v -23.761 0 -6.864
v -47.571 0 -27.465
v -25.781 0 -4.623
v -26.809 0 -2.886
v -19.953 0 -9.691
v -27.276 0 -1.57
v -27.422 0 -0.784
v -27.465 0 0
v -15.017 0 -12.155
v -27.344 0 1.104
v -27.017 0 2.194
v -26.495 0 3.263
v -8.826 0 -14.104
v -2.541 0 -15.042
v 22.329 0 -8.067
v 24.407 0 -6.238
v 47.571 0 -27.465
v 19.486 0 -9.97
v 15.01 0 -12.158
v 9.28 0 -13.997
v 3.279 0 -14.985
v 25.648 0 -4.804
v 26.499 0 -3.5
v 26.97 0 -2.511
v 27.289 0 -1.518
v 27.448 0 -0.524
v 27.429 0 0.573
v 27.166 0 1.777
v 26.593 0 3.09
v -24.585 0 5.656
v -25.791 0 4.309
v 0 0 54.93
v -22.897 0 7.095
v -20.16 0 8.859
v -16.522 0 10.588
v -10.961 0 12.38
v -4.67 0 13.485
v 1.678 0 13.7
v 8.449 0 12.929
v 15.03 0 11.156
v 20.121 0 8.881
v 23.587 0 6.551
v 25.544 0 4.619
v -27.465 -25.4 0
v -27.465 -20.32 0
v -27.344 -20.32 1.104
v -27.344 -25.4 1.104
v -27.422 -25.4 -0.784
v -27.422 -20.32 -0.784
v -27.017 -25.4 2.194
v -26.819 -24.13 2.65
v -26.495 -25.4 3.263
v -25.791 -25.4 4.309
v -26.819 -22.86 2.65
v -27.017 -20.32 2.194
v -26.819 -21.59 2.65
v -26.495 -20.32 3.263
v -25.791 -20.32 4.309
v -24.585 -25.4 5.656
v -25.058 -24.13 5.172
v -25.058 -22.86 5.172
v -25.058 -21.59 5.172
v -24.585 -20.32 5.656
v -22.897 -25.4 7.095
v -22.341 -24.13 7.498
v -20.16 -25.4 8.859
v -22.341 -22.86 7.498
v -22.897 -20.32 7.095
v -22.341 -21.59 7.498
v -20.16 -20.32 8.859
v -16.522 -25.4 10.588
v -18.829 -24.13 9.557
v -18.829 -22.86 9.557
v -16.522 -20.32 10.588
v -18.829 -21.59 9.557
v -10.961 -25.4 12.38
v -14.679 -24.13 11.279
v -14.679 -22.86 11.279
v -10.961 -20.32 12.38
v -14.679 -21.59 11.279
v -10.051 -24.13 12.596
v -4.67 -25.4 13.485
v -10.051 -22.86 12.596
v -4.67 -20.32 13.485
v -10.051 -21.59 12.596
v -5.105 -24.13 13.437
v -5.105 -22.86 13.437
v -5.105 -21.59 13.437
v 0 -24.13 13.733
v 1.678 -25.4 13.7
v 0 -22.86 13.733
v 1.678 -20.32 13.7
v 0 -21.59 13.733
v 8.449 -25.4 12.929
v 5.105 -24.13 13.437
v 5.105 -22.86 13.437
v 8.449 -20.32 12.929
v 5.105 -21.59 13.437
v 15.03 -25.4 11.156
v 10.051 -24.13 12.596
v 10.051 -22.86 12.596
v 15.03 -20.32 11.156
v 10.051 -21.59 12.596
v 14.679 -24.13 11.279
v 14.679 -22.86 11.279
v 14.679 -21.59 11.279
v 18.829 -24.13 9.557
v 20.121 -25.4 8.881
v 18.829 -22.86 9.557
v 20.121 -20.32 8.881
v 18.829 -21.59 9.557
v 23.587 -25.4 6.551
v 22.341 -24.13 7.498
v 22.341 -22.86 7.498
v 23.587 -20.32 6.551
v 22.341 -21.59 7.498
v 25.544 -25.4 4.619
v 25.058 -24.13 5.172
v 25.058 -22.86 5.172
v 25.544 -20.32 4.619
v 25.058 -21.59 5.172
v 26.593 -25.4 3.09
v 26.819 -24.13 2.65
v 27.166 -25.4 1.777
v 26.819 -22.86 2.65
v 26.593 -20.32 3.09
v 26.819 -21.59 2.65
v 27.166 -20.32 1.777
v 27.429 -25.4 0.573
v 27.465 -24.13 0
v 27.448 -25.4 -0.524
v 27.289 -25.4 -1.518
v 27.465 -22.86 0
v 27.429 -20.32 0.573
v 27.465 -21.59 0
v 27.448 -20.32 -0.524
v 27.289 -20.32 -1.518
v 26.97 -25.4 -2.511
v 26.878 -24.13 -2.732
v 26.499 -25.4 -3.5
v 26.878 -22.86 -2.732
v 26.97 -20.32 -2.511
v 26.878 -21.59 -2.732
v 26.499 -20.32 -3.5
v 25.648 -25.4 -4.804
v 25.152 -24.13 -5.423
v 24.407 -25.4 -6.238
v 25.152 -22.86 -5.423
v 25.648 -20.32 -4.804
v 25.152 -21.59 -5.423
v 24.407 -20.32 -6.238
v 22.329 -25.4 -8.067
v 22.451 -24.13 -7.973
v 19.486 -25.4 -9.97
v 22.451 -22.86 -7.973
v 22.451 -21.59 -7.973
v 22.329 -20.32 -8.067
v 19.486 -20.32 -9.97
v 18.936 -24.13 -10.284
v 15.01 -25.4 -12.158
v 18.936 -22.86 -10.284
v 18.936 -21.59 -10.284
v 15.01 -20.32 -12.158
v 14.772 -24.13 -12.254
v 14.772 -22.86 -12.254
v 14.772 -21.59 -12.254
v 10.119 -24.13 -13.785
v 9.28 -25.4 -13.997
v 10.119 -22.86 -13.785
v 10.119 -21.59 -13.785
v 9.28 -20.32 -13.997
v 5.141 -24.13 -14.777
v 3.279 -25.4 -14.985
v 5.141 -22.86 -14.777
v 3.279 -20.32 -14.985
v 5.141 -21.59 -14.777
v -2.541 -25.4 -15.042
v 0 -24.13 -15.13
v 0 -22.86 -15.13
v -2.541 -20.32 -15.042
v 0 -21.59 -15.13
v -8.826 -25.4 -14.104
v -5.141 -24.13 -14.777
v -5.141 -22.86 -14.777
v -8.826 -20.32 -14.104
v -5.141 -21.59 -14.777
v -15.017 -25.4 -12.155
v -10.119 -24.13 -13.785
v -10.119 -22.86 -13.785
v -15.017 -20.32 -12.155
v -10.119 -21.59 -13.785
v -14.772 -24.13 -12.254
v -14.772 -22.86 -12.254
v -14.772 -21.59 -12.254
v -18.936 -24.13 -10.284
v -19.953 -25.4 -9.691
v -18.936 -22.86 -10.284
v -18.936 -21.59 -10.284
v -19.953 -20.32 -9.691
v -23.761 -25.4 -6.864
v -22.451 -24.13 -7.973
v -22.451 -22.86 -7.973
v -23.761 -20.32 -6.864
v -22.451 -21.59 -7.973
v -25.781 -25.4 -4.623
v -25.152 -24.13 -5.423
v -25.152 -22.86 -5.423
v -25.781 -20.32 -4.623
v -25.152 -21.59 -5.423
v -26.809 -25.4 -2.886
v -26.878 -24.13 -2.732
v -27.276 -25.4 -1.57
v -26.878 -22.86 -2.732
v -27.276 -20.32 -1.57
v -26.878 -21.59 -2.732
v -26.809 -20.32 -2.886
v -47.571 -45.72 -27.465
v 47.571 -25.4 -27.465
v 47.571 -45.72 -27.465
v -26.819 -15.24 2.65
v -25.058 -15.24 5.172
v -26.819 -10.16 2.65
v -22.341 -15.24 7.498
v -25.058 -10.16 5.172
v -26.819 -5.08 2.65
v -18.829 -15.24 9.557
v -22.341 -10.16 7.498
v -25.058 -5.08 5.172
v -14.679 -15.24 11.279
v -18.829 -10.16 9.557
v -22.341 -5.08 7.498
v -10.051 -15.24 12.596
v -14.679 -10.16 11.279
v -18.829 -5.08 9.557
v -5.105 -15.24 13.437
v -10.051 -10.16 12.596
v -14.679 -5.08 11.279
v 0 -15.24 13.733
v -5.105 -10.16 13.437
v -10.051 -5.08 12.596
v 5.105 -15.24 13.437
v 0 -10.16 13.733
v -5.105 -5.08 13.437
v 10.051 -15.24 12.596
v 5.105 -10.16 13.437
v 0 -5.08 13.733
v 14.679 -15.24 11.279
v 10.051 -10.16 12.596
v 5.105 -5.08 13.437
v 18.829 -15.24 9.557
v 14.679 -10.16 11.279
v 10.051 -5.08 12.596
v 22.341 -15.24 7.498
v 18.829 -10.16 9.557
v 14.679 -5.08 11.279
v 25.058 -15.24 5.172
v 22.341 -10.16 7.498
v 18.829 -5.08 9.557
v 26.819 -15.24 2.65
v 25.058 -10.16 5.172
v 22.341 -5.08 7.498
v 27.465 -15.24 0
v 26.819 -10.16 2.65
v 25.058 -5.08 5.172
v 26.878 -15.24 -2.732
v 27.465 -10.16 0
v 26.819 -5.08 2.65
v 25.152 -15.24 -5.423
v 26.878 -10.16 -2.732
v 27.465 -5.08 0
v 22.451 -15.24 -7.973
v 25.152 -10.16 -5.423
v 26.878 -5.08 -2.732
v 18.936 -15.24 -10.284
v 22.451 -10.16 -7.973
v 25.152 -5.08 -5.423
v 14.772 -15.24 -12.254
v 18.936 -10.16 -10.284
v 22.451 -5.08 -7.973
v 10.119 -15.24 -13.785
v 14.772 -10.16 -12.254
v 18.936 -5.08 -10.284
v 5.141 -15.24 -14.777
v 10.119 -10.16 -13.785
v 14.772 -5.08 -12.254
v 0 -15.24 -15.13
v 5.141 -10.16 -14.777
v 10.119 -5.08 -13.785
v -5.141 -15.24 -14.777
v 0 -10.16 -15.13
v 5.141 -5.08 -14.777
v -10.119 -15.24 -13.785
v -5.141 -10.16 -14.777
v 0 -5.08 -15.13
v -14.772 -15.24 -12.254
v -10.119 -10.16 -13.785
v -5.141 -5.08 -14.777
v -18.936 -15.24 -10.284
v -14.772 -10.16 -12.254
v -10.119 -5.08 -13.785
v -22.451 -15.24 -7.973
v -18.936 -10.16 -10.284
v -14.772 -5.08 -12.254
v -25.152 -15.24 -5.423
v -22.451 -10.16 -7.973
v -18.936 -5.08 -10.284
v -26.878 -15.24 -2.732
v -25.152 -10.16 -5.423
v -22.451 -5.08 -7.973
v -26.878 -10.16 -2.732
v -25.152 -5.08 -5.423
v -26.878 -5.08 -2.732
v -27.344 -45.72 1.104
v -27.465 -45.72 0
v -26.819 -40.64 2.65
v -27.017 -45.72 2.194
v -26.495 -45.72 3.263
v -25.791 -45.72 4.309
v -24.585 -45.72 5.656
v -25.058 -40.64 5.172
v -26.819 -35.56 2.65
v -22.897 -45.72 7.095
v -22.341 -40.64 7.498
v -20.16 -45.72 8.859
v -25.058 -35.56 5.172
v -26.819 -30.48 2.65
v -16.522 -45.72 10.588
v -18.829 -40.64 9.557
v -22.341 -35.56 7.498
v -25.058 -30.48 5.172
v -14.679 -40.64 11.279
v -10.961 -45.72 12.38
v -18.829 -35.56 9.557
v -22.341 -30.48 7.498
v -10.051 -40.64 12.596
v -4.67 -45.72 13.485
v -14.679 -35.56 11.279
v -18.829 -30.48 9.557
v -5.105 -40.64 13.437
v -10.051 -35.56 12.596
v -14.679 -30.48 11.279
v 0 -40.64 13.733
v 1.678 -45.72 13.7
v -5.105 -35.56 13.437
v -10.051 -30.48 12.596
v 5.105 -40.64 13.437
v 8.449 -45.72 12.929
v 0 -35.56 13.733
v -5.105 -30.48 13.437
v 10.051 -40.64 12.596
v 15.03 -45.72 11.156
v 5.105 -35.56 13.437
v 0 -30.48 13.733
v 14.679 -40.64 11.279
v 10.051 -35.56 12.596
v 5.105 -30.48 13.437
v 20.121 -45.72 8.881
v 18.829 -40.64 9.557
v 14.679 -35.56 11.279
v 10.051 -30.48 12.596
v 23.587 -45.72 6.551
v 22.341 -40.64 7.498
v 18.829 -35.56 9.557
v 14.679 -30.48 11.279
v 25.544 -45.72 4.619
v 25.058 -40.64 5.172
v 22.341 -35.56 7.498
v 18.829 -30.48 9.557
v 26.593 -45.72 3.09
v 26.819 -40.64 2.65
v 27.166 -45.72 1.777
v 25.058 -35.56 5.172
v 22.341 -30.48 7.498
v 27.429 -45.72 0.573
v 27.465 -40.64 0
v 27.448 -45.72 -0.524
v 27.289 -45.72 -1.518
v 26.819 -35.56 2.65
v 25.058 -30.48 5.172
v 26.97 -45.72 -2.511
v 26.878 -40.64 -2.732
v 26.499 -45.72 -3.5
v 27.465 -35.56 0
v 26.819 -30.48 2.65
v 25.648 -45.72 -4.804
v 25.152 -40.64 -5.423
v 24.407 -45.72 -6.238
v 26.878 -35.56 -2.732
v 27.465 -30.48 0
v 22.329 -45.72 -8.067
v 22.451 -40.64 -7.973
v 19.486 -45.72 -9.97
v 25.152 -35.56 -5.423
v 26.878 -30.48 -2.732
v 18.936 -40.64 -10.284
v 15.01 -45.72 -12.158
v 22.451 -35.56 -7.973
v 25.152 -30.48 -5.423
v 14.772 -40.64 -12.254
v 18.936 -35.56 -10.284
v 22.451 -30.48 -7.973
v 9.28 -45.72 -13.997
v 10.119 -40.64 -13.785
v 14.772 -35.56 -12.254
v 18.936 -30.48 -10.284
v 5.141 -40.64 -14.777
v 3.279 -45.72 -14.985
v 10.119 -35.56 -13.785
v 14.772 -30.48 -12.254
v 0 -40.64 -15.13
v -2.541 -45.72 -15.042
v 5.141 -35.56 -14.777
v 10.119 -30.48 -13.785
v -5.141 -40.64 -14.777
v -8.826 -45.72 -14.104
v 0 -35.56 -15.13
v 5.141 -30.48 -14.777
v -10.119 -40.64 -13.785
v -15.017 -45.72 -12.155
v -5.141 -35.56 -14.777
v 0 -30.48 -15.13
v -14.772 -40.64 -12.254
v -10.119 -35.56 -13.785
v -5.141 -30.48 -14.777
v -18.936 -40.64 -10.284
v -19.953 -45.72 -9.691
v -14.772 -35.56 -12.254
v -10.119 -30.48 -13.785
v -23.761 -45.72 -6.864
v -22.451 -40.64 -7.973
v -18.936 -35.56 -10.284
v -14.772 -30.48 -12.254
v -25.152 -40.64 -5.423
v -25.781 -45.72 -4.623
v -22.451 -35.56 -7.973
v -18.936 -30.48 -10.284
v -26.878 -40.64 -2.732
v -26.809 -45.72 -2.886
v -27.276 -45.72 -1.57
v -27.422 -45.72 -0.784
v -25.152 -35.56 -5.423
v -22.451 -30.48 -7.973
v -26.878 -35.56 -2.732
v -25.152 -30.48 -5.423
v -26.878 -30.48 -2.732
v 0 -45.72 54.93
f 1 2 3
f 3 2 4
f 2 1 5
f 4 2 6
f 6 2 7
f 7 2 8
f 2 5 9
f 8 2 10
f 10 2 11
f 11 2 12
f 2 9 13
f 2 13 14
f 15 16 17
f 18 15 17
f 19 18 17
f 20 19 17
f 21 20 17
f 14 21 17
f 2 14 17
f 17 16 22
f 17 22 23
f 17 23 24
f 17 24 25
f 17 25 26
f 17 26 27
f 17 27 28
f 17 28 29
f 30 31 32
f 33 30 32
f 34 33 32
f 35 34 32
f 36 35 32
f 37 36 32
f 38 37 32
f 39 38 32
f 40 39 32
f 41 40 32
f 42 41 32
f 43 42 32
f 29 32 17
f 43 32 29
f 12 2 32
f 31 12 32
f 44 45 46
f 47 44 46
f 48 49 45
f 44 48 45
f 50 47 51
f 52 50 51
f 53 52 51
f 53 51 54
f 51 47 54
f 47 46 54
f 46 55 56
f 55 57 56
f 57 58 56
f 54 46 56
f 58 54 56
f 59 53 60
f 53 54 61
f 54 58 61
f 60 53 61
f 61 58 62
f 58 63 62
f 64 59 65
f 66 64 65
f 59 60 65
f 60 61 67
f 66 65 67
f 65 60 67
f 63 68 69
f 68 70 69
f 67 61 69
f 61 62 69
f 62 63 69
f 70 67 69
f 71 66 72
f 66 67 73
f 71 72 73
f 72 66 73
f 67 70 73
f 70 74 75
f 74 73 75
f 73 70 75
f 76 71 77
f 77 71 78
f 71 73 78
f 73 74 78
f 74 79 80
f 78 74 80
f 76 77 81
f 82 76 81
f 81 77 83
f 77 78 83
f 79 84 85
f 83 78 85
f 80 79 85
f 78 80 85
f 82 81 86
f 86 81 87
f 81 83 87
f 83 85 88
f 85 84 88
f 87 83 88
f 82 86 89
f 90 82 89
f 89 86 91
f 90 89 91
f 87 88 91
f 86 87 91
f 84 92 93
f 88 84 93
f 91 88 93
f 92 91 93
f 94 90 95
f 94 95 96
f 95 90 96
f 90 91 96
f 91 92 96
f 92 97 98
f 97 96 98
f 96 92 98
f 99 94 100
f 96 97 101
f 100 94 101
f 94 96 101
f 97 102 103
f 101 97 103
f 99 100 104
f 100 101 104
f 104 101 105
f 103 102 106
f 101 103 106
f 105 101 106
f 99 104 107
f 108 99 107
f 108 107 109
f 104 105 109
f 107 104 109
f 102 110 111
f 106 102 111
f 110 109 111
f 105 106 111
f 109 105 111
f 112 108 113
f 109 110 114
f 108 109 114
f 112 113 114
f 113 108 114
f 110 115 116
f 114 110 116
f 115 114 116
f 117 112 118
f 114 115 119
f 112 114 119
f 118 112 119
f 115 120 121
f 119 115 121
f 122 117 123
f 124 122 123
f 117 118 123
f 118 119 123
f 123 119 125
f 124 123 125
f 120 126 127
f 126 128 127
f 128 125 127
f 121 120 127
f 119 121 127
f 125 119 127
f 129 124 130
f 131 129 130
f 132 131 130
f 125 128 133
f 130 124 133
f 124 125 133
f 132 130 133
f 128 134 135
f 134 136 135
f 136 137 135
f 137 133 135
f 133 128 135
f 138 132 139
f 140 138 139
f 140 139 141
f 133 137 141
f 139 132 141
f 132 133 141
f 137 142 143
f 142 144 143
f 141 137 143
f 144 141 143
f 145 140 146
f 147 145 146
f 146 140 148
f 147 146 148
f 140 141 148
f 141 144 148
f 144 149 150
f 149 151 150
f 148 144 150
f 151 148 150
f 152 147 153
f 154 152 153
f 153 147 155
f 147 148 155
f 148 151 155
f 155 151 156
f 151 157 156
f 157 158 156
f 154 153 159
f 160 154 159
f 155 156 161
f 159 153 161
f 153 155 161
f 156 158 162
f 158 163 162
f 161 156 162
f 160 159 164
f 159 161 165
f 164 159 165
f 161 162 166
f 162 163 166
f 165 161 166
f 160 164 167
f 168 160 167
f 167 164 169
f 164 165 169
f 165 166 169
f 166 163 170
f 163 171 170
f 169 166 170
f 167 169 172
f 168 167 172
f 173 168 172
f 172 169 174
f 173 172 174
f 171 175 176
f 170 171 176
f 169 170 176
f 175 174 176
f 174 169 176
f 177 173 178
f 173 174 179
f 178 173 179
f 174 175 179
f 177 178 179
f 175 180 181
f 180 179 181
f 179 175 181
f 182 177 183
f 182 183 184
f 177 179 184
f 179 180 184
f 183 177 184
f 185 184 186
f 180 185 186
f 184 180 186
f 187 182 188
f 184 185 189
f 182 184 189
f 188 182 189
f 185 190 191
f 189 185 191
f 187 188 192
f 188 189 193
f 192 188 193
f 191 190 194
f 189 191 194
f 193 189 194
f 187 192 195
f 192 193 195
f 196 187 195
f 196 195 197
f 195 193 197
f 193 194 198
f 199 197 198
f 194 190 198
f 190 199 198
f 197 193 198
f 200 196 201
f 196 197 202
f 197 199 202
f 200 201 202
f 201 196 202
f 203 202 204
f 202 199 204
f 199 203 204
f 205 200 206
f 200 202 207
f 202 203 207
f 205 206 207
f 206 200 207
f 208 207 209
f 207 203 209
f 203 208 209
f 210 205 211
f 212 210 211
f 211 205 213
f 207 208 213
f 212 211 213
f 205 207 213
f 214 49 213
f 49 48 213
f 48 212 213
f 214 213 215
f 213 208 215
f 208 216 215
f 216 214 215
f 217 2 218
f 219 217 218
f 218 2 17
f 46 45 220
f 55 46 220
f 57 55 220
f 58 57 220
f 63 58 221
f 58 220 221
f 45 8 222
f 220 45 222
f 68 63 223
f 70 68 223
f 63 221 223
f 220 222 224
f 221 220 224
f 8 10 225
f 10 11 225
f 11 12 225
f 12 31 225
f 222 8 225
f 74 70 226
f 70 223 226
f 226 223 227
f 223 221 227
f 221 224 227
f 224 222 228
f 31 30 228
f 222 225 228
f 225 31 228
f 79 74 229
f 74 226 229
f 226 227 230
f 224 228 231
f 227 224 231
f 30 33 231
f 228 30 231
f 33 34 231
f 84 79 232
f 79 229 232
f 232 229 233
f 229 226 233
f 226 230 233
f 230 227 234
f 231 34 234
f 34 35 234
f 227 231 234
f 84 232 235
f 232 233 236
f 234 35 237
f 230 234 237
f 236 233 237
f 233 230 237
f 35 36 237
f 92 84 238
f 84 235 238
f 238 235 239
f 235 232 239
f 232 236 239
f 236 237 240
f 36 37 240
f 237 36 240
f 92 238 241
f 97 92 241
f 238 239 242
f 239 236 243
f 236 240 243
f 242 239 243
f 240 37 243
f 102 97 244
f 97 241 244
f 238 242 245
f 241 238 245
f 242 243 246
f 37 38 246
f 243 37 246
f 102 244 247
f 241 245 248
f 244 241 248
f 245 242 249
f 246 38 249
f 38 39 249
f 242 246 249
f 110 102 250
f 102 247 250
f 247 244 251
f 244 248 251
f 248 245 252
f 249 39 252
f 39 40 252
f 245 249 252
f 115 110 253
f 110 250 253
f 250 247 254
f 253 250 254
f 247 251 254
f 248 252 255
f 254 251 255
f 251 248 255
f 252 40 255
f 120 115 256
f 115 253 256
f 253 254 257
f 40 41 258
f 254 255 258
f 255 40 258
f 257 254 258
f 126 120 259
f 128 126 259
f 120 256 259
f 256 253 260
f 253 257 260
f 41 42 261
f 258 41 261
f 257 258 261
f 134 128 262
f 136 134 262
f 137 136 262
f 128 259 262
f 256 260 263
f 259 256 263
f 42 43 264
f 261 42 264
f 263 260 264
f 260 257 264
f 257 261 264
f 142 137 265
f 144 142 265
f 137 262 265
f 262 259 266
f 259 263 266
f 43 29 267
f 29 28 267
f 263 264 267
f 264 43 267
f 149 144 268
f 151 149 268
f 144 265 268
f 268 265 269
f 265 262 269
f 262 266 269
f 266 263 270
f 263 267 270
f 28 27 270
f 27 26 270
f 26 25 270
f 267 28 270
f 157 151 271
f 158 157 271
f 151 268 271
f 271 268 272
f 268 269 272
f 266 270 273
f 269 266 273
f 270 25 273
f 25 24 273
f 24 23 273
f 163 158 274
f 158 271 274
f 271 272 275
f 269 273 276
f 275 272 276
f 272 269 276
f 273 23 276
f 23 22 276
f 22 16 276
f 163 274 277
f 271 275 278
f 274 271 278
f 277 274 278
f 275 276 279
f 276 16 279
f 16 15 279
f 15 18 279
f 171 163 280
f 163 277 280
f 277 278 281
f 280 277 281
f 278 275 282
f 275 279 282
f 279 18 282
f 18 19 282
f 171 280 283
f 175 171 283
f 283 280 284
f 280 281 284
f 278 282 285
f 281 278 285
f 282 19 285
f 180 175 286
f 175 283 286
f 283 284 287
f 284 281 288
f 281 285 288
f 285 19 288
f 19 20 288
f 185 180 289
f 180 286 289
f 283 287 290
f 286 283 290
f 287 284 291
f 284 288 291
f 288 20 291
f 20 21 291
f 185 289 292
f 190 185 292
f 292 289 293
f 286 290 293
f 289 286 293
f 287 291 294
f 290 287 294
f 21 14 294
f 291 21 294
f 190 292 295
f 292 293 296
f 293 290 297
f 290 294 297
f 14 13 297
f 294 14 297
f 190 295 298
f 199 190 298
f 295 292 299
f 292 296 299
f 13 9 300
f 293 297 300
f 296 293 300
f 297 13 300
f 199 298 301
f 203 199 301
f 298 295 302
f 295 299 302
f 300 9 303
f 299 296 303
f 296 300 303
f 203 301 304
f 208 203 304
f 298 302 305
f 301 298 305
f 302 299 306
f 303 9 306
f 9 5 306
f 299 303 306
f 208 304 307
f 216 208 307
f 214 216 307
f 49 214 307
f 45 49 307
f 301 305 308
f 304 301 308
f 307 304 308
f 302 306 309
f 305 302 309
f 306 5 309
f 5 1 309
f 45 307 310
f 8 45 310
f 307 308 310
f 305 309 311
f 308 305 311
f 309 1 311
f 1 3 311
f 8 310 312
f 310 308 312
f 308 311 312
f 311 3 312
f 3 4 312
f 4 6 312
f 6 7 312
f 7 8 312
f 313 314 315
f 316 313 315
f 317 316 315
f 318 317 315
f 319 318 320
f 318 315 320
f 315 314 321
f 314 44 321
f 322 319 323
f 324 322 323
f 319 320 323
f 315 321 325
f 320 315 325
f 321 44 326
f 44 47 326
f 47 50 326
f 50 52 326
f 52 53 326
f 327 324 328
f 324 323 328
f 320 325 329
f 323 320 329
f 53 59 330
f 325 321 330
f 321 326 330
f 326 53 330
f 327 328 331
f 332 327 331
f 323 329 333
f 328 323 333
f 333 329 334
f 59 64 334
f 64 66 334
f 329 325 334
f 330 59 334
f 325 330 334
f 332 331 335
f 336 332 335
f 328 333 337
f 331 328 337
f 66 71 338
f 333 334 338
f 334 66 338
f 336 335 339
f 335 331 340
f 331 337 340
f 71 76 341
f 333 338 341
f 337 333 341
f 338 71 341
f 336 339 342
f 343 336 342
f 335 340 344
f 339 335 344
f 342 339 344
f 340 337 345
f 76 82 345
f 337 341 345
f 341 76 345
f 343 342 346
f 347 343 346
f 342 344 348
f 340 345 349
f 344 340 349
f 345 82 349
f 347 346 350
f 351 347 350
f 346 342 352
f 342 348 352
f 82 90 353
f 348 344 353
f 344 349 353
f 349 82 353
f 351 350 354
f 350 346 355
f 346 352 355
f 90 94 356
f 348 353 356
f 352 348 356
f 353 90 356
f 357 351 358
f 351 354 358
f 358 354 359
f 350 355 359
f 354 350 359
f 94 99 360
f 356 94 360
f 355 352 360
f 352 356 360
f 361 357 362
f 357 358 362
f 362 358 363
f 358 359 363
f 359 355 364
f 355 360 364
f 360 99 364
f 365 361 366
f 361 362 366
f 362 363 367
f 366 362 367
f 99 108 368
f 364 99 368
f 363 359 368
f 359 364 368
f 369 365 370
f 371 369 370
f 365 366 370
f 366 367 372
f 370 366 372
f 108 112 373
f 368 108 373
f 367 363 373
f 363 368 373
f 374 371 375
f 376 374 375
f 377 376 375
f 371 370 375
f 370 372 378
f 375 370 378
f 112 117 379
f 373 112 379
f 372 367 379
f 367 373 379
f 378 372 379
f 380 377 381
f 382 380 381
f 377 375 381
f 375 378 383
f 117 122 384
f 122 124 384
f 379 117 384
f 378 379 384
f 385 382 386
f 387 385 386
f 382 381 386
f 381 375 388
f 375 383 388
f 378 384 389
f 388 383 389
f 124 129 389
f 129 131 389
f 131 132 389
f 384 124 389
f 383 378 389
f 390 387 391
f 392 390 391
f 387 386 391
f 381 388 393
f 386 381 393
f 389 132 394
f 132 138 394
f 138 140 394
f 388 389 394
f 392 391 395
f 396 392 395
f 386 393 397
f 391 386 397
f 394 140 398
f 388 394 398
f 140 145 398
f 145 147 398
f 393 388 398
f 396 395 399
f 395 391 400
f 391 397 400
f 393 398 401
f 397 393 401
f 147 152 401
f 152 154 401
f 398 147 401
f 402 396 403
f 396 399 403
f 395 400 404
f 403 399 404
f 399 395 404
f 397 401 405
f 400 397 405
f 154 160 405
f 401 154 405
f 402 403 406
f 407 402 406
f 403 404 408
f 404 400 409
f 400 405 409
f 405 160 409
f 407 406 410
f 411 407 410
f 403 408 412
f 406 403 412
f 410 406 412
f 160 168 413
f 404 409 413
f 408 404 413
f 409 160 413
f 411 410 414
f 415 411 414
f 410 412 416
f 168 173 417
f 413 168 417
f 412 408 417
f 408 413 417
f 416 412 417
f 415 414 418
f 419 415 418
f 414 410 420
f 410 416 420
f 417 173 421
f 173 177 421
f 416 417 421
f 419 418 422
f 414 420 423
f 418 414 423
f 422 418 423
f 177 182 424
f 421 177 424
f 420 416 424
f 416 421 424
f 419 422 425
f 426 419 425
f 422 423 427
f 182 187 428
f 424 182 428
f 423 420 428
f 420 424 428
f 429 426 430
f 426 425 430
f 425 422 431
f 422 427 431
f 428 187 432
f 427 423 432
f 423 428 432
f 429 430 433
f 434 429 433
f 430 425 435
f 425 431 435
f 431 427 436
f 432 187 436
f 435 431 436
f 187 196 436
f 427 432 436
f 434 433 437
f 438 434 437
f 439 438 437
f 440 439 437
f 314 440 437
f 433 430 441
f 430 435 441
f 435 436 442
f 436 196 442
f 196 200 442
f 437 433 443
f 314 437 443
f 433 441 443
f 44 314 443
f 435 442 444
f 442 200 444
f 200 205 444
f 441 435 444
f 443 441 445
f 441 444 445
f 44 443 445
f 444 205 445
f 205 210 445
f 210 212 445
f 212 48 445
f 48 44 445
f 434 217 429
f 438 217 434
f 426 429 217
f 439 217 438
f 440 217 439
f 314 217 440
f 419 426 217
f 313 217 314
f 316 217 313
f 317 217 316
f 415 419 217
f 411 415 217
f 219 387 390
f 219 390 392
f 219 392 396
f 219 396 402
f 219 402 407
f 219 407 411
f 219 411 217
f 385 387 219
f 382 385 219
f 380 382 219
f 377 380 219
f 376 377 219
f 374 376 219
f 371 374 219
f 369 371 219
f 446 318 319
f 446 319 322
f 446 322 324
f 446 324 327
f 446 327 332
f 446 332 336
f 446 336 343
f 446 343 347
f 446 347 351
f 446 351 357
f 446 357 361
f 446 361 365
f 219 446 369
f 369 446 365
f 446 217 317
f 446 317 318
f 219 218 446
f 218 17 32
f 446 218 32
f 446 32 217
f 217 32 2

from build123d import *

# Parameters (mm, degrees)
F1_DEPTH = 20.32
F2_DEPTH = 25.4


with BuildPart() as f1:
    # F0 (on Front) → F1 (new body)
    with BuildSketch(Plane.XZ):
        Polygon((47.5709541673, -27.4651031941), (0, 54.9302063882), (-47.5709541673, -27.4651031941), align=None)
        with BuildLine():
            add(Edge.make_bspline(
                [(-27.4651031941, 0), (-27.3697597672, 7.1745393947), (0, 20.2905637994), (41.1986581774, 0.5475112228), (0, -23.009275005), (-27.5614500072, -7.2500436448), (-27.4651031941, 0)],
                knots=[0, 0, 0, 0, 0.2486913963, 0.4973827926, 0.7486913963, 1, 1, 1, 1], degree=3))
        make_face(mode=Mode.SUBTRACT)
    extrude(amount=F1_DEPTH)

    # F0 (on Front) + F1_face (on face) → F2 (join)
    with BuildSketch(Plane.XZ):
        Polygon((47.5709541673, -27.4651031941), (0, 54.9302063882), (-47.5709541673, -27.4651031941), align=None)
        with BuildLine():
            add(Edge.make_bspline(
                [(-27.4651031941, 0), (-27.3697597672, 7.1745393947), (0, 20.2905637994), (41.1986581774, 0.5475112228), (0, -23.009275005), (-27.5614500072, -7.2500436448), (-27.4651031941, 0)],
                knots=[0, 0, 0, 0, 0.2486913963, 0.4973827926, 0.7486913963, 1, 1, 1, 1], degree=3))
        make_face(mode=Mode.SUBTRACT)
    with BuildSketch(Plane(origin=(-0.0019370848, -20.32, 0.239959429), x_dir=(1, 0, 0), z_dir=(0, -1, 0))):
        Polygon((-47.5690170825, -27.7050626231), (47.5728912522, -27.7050626231), (0.0019370848, 54.6902469592), align=None)
        with BuildLine():
            add(Edge.make_bspline(
                [(-27.4631661093, -0.239959429), (-27.3678226824, 6.9345799657), (0.0019370848, 20.0506043704), (41.2005952622, 0.3075517938), (0.0019370848, -23.249234434), (-27.5595129224, -7.4900030738), (-27.4631661093, -0.239959429)],
                knots=[0, 0, 0, 0, 0.2486913963, 0.4973827926, 0.7486913963, 1, 1, 1, 1], degree=3))
        make_face(mode=Mode.SUBTRACT)
    extrude(amount=F2_DEPTH)


solid = f1.part
